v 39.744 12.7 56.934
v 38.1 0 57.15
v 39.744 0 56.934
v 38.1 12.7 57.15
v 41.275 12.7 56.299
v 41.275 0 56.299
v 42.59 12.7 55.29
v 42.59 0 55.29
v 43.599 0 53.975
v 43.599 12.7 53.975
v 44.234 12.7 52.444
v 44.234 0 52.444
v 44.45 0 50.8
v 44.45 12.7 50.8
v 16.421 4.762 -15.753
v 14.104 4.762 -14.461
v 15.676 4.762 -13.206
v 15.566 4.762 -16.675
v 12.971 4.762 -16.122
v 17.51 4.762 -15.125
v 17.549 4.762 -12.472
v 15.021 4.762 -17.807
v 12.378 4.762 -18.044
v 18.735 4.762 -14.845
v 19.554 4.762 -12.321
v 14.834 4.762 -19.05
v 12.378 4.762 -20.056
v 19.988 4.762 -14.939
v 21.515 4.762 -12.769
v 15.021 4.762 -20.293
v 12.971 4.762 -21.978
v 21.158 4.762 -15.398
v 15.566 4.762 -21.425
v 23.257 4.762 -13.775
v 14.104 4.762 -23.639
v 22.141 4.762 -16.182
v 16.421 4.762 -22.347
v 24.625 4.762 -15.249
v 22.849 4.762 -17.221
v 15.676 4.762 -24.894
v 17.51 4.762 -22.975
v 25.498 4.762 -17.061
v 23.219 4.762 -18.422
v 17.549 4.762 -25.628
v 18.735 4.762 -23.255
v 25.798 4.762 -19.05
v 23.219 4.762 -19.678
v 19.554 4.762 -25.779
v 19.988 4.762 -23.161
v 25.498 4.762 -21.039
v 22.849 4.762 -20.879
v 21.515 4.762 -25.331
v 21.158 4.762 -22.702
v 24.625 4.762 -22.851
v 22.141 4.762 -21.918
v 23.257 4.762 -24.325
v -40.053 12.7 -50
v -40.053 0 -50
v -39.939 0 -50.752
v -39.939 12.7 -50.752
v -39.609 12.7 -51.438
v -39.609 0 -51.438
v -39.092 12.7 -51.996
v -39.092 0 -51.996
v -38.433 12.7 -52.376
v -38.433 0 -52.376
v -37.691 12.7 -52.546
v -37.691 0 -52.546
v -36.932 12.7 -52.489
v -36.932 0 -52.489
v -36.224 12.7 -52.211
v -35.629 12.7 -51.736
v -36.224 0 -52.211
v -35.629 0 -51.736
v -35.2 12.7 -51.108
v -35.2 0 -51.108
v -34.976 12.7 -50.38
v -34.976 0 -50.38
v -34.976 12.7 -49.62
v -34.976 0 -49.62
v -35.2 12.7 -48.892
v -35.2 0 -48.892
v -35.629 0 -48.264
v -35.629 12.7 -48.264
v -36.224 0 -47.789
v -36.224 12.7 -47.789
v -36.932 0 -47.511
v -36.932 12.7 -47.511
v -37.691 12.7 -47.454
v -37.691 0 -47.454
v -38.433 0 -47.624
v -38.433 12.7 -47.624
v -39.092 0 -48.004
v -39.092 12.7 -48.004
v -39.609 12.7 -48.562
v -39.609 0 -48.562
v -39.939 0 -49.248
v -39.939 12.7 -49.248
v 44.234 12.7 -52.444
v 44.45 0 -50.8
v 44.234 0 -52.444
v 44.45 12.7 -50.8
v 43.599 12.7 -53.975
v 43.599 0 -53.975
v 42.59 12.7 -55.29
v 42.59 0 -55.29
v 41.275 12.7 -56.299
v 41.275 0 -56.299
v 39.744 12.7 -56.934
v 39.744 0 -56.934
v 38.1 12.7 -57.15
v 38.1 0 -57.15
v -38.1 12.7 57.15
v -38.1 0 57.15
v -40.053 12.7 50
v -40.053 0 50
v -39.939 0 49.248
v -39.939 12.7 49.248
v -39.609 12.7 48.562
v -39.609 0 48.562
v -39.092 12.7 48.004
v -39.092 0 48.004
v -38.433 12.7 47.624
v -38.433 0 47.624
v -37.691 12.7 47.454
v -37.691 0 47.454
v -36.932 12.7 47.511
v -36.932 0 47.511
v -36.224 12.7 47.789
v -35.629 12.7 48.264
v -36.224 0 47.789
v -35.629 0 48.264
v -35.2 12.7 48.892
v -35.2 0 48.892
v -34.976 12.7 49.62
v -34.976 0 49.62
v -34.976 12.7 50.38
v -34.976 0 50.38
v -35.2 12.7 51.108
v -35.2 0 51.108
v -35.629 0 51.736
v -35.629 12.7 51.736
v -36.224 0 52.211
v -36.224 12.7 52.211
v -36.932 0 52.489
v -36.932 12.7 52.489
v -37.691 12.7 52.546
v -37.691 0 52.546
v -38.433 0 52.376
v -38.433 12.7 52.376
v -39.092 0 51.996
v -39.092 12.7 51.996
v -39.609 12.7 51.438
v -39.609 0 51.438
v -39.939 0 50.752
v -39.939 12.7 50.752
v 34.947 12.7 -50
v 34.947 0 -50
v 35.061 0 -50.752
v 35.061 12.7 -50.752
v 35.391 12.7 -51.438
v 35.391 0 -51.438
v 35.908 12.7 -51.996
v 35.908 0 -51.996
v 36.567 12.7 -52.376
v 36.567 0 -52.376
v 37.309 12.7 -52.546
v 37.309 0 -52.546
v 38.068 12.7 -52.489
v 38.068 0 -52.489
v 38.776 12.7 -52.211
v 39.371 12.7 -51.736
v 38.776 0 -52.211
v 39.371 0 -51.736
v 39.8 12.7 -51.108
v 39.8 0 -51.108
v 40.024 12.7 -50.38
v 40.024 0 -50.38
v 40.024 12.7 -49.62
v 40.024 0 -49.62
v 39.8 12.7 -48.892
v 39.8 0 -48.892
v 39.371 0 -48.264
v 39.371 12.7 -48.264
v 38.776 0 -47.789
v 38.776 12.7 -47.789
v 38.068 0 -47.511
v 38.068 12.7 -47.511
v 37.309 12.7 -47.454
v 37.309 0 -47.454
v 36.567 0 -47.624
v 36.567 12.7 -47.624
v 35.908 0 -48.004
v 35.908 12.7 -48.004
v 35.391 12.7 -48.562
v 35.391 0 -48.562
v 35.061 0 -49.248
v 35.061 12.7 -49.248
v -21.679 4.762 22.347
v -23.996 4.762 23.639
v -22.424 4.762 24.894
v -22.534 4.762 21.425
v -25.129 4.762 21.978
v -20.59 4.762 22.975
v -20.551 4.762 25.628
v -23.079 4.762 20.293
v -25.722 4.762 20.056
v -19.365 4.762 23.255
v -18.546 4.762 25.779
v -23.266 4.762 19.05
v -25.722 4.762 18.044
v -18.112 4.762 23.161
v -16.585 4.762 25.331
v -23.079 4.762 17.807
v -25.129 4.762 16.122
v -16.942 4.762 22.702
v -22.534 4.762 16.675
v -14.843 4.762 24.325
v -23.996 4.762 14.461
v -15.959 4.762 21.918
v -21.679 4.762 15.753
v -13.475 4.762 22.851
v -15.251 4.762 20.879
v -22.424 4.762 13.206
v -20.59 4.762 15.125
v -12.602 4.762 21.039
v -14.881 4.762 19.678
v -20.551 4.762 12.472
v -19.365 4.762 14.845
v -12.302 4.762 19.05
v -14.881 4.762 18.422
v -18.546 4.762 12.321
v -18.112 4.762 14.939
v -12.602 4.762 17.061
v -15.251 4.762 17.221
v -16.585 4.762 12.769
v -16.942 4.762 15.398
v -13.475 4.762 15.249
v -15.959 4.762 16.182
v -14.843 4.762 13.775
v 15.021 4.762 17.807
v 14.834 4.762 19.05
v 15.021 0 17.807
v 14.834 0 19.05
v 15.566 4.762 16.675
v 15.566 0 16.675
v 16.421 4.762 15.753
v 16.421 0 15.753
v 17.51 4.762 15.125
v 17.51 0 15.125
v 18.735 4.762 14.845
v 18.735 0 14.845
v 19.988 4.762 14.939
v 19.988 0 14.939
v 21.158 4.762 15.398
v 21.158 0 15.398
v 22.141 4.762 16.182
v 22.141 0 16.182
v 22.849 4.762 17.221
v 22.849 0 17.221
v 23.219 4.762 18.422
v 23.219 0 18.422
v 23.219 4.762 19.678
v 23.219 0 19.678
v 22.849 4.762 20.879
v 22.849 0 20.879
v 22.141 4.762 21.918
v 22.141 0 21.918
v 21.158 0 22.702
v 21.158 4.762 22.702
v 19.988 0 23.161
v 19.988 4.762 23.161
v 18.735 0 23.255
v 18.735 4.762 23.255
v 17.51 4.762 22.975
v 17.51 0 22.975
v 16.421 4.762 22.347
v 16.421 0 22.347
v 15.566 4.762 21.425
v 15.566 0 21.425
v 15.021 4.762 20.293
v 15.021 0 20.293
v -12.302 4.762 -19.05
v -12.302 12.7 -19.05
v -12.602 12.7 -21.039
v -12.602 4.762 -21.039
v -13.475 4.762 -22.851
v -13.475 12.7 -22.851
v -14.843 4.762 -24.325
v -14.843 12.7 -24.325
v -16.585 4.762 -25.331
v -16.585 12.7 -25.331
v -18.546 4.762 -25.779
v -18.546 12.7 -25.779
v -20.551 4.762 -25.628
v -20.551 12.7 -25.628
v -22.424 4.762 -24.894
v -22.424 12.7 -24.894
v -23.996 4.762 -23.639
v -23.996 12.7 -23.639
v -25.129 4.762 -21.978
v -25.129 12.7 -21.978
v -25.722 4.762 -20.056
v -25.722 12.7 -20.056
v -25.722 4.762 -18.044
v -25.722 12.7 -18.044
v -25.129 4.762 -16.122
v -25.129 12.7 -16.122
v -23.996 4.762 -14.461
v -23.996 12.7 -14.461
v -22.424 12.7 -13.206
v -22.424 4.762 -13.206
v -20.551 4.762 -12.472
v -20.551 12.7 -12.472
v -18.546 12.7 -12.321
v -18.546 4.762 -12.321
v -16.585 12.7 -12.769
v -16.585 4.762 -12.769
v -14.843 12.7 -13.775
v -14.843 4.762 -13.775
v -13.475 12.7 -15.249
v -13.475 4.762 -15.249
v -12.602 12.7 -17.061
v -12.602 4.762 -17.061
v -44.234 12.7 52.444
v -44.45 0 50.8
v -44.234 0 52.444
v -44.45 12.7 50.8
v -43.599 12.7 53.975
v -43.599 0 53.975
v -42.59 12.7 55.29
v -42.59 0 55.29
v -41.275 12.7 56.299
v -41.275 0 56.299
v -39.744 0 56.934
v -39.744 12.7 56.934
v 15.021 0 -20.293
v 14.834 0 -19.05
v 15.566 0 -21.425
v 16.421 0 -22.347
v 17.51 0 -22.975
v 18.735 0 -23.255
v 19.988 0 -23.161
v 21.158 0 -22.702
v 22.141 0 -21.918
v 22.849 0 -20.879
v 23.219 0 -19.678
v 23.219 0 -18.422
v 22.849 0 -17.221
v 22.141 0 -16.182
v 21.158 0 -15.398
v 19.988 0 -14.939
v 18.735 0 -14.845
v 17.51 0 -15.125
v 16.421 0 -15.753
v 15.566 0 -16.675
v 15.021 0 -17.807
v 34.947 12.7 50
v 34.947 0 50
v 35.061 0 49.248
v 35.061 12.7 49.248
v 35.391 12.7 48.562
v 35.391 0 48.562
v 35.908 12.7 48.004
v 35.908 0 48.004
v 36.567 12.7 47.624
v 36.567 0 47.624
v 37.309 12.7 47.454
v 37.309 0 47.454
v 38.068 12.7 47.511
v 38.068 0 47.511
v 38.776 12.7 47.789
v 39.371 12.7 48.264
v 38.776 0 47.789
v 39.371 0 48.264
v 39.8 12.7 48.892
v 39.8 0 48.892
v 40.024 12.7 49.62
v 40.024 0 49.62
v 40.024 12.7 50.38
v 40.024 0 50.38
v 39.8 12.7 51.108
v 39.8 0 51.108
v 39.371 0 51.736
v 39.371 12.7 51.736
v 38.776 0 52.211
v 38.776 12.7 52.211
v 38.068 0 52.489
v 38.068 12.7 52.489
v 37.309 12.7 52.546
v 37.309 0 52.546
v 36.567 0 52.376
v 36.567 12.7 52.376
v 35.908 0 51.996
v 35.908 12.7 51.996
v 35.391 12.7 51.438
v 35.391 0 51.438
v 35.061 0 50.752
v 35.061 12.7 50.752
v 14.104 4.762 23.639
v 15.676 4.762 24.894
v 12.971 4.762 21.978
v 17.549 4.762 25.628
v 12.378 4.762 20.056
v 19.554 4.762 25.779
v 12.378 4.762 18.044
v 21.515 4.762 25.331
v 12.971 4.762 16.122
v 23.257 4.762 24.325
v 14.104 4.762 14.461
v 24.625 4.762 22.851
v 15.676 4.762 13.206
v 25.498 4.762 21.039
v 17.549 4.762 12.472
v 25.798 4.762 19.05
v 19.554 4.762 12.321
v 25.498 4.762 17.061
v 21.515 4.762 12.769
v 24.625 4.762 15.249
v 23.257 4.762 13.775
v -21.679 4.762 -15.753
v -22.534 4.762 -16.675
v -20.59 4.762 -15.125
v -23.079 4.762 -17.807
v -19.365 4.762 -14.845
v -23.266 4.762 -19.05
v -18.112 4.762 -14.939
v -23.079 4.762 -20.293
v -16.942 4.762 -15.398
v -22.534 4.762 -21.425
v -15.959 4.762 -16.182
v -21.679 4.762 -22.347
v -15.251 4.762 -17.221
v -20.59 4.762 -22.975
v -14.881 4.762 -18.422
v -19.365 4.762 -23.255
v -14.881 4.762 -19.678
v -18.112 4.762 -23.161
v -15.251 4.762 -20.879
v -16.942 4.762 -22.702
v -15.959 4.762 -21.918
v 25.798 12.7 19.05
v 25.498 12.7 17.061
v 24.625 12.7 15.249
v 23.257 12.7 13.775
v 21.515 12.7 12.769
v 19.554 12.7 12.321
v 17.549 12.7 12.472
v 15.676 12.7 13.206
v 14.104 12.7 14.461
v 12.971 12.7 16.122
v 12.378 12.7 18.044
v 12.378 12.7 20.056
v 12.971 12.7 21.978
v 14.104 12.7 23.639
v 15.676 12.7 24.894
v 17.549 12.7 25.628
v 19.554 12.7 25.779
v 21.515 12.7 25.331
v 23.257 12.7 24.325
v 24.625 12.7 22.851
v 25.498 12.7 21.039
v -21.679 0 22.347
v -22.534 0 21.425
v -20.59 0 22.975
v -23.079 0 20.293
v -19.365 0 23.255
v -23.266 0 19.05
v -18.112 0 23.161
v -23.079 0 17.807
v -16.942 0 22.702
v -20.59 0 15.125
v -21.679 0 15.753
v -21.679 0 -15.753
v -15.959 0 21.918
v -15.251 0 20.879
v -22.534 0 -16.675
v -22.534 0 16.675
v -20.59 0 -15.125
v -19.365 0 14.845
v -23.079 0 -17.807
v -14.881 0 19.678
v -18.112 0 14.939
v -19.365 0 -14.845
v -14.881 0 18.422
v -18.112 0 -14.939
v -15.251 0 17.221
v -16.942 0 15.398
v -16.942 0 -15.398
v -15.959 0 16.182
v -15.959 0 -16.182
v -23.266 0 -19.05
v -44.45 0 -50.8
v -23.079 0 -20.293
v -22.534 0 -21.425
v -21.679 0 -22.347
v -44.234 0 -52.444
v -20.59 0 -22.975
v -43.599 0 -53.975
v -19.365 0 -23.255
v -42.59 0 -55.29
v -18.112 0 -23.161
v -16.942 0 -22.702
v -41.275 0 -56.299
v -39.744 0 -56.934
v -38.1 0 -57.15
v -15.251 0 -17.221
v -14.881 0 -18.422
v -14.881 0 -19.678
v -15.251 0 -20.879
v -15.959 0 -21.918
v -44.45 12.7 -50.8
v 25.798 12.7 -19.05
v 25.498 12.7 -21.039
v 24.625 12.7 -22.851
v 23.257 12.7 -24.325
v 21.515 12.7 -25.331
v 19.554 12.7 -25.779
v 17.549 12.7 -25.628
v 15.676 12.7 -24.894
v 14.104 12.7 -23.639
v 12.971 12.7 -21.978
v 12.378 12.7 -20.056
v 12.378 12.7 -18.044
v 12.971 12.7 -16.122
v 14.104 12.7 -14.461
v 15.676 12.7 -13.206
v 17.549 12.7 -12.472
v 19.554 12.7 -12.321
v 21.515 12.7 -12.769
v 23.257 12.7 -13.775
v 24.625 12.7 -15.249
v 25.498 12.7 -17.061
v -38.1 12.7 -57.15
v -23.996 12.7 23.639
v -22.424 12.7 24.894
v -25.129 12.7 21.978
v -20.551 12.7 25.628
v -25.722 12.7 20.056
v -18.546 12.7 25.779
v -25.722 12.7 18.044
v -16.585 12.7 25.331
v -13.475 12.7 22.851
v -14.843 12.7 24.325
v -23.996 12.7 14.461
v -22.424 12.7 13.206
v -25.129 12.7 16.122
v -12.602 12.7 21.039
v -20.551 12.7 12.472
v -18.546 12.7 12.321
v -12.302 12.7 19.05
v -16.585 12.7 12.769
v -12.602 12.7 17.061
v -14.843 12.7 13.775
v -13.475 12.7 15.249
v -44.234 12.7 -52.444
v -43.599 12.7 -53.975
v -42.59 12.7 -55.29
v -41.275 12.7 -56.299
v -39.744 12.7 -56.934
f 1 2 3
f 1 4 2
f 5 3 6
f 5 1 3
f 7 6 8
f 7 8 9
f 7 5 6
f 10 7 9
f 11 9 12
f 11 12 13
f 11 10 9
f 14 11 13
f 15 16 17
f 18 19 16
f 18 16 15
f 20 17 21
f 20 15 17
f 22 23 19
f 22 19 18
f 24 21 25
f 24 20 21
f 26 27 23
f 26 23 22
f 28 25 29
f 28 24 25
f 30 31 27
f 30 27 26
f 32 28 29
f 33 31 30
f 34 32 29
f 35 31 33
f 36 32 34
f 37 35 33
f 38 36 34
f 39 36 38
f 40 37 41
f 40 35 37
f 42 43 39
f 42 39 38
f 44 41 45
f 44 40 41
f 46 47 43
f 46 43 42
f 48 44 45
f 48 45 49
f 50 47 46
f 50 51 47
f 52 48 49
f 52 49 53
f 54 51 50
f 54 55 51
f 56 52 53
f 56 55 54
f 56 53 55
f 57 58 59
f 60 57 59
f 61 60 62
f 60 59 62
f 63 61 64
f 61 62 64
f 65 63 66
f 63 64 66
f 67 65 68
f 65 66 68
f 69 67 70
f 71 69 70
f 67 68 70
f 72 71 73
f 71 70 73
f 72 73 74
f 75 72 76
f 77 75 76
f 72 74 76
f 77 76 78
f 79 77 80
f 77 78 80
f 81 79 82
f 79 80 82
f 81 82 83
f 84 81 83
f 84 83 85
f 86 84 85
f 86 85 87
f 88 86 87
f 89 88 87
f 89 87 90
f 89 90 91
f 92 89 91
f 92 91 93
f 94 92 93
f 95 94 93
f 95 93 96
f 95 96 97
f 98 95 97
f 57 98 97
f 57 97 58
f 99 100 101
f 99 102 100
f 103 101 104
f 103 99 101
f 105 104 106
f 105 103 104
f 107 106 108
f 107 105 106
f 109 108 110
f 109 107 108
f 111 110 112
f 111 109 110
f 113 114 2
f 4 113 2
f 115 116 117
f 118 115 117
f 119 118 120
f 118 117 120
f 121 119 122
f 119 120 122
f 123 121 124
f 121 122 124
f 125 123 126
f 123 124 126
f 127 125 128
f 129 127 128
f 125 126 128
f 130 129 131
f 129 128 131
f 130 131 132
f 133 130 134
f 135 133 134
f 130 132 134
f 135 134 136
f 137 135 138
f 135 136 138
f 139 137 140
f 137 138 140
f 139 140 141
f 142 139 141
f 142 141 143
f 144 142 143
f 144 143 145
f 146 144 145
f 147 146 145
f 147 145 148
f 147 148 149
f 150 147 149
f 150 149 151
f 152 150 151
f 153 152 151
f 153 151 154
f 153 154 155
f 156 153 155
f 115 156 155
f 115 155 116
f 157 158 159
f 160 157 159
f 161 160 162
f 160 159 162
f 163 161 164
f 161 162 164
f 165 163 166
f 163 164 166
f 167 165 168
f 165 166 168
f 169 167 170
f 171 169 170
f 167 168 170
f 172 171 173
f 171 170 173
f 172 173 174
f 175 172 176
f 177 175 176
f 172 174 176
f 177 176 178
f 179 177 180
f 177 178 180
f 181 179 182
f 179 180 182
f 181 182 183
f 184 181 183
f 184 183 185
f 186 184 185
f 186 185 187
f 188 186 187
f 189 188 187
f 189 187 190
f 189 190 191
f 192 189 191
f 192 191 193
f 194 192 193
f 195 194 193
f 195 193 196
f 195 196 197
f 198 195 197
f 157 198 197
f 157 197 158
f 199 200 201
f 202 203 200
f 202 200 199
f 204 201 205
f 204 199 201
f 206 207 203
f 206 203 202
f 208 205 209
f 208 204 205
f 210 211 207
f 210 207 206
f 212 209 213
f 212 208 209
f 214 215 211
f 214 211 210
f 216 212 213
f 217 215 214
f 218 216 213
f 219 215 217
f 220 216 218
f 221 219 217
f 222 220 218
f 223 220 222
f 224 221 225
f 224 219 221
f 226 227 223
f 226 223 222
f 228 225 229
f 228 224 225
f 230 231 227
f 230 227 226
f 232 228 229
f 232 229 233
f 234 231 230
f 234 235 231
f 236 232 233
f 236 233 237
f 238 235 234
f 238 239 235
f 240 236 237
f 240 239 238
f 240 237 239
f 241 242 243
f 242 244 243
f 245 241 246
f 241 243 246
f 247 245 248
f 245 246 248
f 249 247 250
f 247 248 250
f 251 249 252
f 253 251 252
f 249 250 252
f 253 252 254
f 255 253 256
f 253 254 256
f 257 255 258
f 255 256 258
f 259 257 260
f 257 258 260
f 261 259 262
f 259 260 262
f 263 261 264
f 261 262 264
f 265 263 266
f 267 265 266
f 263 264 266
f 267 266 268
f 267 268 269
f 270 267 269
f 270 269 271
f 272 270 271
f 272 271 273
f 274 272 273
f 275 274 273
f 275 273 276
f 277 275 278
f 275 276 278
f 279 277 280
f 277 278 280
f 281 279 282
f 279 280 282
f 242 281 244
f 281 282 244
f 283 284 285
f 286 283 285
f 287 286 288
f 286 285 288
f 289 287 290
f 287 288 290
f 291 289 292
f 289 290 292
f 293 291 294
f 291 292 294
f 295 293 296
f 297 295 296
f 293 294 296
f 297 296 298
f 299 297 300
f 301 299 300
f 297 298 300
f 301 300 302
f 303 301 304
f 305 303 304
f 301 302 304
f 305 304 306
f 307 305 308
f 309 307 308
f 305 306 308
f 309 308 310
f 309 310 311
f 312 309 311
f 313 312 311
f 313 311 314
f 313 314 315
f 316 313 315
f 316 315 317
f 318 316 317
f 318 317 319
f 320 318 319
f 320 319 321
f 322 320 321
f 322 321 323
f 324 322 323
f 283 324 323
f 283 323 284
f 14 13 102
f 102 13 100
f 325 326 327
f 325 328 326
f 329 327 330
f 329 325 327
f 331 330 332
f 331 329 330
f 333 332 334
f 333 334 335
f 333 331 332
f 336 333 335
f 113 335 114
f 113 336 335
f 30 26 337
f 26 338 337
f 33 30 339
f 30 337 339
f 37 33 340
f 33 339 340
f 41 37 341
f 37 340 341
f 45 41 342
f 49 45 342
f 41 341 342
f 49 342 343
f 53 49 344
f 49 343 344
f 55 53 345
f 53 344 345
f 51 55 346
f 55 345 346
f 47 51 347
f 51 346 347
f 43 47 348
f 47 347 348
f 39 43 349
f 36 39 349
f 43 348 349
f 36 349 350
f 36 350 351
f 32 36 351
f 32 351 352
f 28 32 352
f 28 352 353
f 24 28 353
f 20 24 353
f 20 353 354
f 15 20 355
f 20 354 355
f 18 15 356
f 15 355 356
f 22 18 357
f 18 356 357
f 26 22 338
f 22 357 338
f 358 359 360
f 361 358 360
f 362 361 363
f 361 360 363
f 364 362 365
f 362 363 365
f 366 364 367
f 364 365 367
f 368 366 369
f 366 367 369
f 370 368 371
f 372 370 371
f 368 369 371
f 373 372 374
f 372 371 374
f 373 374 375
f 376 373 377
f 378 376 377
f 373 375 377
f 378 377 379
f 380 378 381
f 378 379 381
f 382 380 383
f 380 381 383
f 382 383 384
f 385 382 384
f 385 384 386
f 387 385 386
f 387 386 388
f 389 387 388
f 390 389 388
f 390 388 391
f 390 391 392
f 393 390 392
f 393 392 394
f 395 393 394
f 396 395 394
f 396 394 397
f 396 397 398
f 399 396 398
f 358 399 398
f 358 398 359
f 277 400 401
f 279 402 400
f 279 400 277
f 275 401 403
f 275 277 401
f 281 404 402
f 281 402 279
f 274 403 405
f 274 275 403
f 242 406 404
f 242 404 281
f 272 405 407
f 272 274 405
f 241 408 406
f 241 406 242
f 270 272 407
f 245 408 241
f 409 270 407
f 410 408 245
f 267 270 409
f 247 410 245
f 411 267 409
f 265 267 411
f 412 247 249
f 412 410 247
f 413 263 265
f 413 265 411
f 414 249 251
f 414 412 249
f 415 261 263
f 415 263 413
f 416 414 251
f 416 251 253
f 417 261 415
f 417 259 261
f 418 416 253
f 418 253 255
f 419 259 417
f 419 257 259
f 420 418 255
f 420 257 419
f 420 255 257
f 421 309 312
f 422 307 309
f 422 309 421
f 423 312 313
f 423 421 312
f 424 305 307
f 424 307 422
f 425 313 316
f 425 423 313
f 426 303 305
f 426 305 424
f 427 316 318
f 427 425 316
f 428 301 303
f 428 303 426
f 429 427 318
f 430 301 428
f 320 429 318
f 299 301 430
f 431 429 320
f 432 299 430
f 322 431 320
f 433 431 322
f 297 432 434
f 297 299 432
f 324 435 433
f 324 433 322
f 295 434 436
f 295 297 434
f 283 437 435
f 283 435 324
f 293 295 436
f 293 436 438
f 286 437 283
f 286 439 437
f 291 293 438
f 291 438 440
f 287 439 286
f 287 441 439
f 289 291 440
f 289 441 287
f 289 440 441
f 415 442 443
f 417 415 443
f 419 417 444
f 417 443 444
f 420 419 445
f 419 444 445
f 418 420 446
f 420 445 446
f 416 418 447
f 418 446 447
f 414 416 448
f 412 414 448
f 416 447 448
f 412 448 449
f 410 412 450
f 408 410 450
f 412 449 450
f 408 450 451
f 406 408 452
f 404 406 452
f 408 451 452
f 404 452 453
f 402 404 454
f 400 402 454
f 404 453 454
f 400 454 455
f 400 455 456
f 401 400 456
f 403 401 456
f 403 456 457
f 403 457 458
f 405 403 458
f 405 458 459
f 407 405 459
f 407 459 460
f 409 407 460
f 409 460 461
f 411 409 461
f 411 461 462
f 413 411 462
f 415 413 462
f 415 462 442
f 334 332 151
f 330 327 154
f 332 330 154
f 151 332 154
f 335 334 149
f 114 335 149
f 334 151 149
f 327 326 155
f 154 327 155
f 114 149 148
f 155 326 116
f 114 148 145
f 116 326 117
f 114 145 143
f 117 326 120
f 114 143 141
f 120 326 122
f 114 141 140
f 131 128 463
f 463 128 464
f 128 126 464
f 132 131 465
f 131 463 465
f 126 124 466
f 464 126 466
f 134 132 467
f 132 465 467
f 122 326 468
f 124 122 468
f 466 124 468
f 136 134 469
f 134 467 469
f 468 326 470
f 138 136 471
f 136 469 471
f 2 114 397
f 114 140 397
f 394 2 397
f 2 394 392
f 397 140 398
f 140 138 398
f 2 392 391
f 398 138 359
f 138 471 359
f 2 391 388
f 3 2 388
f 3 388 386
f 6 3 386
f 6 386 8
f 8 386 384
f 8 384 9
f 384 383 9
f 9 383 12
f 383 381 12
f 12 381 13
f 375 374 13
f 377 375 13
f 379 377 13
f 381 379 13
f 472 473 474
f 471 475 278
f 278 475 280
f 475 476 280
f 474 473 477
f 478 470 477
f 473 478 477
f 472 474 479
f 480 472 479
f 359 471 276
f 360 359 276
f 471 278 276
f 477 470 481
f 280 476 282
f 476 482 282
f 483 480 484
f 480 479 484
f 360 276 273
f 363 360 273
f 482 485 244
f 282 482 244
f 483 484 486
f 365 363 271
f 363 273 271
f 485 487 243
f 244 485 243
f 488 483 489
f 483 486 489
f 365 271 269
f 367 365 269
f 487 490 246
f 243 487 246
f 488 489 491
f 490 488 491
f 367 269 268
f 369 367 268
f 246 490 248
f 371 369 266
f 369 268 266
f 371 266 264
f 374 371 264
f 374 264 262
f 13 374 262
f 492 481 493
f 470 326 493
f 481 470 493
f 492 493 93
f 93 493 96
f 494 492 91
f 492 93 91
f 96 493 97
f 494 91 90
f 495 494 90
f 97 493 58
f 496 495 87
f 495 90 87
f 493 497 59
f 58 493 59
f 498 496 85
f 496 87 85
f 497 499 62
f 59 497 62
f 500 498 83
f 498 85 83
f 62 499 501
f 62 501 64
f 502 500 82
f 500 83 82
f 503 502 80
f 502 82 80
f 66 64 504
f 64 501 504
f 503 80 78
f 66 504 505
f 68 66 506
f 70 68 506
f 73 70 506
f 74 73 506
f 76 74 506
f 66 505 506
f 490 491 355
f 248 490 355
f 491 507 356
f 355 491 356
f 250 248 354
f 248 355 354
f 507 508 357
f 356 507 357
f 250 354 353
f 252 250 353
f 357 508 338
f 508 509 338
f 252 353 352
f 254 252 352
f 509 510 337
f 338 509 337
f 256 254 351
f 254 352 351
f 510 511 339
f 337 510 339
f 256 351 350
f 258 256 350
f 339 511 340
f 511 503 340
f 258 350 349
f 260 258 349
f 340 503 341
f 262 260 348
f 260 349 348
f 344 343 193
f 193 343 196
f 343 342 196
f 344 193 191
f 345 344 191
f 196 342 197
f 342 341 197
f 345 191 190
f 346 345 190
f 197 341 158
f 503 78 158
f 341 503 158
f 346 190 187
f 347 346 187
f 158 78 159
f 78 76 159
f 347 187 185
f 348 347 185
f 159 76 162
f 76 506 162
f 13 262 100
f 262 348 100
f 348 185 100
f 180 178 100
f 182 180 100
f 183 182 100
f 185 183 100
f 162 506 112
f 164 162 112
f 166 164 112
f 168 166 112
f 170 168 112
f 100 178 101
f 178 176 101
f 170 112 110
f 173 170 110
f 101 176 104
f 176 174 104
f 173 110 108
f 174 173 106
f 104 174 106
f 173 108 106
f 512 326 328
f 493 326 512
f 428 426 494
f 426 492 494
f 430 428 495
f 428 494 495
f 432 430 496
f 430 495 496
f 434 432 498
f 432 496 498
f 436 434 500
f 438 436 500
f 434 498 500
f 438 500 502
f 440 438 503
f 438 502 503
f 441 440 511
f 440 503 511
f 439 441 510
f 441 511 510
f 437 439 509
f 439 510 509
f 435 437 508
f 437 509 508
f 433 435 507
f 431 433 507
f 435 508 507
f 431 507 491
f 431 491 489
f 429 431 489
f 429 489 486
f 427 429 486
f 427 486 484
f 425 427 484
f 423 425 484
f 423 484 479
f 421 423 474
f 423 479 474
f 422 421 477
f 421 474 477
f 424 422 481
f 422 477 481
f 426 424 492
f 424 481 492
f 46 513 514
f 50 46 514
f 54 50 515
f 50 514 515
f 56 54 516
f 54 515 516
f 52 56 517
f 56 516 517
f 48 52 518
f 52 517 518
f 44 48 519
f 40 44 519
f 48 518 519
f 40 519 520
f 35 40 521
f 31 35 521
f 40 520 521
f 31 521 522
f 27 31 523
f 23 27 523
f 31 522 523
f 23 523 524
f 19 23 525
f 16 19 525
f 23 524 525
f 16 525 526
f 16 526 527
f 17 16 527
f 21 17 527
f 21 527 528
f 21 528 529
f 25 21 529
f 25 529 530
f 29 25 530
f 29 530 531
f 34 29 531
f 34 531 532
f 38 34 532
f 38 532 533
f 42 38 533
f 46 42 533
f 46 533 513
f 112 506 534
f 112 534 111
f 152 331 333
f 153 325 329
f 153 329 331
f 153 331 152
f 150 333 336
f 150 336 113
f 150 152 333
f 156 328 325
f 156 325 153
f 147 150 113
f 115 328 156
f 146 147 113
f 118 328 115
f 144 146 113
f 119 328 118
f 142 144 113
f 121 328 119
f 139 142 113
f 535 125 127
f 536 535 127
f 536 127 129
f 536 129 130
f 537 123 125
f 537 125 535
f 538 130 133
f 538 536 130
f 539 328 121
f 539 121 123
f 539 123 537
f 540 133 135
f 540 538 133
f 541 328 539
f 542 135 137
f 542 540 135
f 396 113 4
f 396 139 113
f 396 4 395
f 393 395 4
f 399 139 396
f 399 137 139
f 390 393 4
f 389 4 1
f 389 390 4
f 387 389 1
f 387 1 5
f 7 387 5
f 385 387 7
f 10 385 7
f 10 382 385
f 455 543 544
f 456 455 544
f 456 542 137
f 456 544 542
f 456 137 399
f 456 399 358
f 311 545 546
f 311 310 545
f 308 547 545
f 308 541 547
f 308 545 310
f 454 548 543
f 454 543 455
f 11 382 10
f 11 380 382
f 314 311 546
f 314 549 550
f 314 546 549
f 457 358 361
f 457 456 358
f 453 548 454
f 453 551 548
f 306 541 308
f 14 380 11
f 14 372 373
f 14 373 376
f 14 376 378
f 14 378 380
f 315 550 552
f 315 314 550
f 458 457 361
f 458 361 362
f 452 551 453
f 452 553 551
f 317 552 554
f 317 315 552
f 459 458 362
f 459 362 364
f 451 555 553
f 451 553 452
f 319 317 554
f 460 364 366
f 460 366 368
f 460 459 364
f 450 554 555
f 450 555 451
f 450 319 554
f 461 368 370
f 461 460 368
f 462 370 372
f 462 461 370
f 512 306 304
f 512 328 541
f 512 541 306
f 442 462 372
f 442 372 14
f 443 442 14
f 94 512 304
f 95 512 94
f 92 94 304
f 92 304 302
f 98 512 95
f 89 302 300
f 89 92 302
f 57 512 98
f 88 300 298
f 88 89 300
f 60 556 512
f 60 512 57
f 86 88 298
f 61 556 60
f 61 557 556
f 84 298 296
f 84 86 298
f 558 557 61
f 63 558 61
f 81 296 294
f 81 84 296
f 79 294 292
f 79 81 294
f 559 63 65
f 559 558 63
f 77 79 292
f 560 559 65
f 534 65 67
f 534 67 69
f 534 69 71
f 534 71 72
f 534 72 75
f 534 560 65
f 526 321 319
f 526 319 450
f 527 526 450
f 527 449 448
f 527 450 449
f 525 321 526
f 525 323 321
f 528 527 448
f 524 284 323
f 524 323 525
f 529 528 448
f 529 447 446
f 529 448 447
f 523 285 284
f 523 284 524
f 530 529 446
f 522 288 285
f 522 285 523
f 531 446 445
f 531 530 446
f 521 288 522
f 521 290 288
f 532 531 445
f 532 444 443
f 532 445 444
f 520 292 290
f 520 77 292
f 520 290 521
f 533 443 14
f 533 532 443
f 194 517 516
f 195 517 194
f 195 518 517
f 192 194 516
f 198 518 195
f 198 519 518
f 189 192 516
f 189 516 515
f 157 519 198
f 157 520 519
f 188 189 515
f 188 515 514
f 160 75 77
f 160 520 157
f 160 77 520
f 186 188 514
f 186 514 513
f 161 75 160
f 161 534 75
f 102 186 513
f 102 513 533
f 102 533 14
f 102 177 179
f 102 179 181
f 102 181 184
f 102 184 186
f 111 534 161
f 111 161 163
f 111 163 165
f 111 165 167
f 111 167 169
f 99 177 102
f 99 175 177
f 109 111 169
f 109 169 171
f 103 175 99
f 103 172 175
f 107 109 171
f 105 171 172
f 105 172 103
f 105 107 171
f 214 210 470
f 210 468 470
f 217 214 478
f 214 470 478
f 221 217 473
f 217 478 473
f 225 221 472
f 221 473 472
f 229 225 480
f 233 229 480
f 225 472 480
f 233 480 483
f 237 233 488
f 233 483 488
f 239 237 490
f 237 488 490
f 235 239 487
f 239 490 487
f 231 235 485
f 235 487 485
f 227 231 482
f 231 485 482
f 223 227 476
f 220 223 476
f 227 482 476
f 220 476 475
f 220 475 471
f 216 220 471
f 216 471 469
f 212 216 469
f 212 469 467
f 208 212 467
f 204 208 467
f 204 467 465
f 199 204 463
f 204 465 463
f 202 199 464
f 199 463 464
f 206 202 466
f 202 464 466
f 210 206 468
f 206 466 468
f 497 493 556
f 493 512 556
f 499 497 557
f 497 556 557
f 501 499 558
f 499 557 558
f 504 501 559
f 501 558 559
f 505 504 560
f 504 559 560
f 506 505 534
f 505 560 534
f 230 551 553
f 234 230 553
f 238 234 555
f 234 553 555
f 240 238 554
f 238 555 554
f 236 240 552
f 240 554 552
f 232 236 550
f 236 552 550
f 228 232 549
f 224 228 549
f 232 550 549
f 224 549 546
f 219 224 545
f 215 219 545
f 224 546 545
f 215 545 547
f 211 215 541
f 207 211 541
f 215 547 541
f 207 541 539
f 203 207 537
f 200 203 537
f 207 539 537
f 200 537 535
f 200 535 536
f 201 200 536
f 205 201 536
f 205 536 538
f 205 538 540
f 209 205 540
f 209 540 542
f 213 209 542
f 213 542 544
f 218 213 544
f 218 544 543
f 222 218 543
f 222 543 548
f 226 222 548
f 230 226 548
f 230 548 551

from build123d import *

# Parameters (mm, degrees)
SKETCH1_W                                         = 88.9
SKETCH1_H                                         = 114.3
BOSS_EXTRUDE1_DEPTH                               = 12.7
FILLET1_R                                         = 6.35
CBORE_FOR_5_16_SOCKET_HEAD_CAP_SCREW1_D           = 8.4328
CBORE_FOR_5_16_SOCKET_HEAD_CAP_SCREW1_CBORE_D     = 13.49502
CBORE_FOR_5_16_SOCKET_HEAD_CAP_SCREW1_CBORE_DEPTH = 7.9375
F_1_4_20_TAPPED_HOLE1_D                           = 5.1054


with BuildPart() as part:
    # Sketch1 → Boss-Extrude1 (new body)
    with BuildSketch(Plane(origin=(0, 0, 0), x_dir=(1, 0, 0), z_dir=(0, 1, 0))):
        Rectangle(SKETCH1_W, SKETCH1_H)
    extrude(amount=BOSS_EXTRUDE1_DEPTH)

    # Fillet1
    fillet1_edges = [part.edges().sort_by_distance(p)[0] for p in [
        (-44.45, 6.35, -57.15),
        (44.45, 6.35, -57.15),
        (44.45, 6.35, 57.15),
        (-44.45, 6.35, 57.15),
    ]]
    fillet(fillet1_edges, radius=FILLET1_R)

    # CBORE for 5/16 Socket Head Cap Screw1 (through all)
    with Locations(Plane(origin=(0, 12.7, 0), x_dir=(1, 0, 0), z_dir=(0, 1, 0))):
        with Locations((-19.05, 19.05), (-19.05, -19.05), (19.05, -19.05), (19.05, 19.05)):
            CounterBoreHole(CBORE_FOR_5_16_SOCKET_HEAD_CAP_SCREW1_D / 2, CBORE_FOR_5_16_SOCKET_HEAD_CAP_SCREW1_CBORE_D / 2, CBORE_FOR_5_16_SOCKET_HEAD_CAP_SCREW1_CBORE_DEPTH)

    # 1/4-20 Tapped Hole1 (through all)
    with Locations(Plane(origin=(0, 12.7, 0), x_dir=(1, 0, 0), z_dir=(0, 1, 0))):
        with Locations((-37.5, 50), (37.5, 50), (37.5, -50), (-37.5, -50)):
            Hole(F_1_4_20_TAPPED_HOLE1_D / 2)


solid = part.part
